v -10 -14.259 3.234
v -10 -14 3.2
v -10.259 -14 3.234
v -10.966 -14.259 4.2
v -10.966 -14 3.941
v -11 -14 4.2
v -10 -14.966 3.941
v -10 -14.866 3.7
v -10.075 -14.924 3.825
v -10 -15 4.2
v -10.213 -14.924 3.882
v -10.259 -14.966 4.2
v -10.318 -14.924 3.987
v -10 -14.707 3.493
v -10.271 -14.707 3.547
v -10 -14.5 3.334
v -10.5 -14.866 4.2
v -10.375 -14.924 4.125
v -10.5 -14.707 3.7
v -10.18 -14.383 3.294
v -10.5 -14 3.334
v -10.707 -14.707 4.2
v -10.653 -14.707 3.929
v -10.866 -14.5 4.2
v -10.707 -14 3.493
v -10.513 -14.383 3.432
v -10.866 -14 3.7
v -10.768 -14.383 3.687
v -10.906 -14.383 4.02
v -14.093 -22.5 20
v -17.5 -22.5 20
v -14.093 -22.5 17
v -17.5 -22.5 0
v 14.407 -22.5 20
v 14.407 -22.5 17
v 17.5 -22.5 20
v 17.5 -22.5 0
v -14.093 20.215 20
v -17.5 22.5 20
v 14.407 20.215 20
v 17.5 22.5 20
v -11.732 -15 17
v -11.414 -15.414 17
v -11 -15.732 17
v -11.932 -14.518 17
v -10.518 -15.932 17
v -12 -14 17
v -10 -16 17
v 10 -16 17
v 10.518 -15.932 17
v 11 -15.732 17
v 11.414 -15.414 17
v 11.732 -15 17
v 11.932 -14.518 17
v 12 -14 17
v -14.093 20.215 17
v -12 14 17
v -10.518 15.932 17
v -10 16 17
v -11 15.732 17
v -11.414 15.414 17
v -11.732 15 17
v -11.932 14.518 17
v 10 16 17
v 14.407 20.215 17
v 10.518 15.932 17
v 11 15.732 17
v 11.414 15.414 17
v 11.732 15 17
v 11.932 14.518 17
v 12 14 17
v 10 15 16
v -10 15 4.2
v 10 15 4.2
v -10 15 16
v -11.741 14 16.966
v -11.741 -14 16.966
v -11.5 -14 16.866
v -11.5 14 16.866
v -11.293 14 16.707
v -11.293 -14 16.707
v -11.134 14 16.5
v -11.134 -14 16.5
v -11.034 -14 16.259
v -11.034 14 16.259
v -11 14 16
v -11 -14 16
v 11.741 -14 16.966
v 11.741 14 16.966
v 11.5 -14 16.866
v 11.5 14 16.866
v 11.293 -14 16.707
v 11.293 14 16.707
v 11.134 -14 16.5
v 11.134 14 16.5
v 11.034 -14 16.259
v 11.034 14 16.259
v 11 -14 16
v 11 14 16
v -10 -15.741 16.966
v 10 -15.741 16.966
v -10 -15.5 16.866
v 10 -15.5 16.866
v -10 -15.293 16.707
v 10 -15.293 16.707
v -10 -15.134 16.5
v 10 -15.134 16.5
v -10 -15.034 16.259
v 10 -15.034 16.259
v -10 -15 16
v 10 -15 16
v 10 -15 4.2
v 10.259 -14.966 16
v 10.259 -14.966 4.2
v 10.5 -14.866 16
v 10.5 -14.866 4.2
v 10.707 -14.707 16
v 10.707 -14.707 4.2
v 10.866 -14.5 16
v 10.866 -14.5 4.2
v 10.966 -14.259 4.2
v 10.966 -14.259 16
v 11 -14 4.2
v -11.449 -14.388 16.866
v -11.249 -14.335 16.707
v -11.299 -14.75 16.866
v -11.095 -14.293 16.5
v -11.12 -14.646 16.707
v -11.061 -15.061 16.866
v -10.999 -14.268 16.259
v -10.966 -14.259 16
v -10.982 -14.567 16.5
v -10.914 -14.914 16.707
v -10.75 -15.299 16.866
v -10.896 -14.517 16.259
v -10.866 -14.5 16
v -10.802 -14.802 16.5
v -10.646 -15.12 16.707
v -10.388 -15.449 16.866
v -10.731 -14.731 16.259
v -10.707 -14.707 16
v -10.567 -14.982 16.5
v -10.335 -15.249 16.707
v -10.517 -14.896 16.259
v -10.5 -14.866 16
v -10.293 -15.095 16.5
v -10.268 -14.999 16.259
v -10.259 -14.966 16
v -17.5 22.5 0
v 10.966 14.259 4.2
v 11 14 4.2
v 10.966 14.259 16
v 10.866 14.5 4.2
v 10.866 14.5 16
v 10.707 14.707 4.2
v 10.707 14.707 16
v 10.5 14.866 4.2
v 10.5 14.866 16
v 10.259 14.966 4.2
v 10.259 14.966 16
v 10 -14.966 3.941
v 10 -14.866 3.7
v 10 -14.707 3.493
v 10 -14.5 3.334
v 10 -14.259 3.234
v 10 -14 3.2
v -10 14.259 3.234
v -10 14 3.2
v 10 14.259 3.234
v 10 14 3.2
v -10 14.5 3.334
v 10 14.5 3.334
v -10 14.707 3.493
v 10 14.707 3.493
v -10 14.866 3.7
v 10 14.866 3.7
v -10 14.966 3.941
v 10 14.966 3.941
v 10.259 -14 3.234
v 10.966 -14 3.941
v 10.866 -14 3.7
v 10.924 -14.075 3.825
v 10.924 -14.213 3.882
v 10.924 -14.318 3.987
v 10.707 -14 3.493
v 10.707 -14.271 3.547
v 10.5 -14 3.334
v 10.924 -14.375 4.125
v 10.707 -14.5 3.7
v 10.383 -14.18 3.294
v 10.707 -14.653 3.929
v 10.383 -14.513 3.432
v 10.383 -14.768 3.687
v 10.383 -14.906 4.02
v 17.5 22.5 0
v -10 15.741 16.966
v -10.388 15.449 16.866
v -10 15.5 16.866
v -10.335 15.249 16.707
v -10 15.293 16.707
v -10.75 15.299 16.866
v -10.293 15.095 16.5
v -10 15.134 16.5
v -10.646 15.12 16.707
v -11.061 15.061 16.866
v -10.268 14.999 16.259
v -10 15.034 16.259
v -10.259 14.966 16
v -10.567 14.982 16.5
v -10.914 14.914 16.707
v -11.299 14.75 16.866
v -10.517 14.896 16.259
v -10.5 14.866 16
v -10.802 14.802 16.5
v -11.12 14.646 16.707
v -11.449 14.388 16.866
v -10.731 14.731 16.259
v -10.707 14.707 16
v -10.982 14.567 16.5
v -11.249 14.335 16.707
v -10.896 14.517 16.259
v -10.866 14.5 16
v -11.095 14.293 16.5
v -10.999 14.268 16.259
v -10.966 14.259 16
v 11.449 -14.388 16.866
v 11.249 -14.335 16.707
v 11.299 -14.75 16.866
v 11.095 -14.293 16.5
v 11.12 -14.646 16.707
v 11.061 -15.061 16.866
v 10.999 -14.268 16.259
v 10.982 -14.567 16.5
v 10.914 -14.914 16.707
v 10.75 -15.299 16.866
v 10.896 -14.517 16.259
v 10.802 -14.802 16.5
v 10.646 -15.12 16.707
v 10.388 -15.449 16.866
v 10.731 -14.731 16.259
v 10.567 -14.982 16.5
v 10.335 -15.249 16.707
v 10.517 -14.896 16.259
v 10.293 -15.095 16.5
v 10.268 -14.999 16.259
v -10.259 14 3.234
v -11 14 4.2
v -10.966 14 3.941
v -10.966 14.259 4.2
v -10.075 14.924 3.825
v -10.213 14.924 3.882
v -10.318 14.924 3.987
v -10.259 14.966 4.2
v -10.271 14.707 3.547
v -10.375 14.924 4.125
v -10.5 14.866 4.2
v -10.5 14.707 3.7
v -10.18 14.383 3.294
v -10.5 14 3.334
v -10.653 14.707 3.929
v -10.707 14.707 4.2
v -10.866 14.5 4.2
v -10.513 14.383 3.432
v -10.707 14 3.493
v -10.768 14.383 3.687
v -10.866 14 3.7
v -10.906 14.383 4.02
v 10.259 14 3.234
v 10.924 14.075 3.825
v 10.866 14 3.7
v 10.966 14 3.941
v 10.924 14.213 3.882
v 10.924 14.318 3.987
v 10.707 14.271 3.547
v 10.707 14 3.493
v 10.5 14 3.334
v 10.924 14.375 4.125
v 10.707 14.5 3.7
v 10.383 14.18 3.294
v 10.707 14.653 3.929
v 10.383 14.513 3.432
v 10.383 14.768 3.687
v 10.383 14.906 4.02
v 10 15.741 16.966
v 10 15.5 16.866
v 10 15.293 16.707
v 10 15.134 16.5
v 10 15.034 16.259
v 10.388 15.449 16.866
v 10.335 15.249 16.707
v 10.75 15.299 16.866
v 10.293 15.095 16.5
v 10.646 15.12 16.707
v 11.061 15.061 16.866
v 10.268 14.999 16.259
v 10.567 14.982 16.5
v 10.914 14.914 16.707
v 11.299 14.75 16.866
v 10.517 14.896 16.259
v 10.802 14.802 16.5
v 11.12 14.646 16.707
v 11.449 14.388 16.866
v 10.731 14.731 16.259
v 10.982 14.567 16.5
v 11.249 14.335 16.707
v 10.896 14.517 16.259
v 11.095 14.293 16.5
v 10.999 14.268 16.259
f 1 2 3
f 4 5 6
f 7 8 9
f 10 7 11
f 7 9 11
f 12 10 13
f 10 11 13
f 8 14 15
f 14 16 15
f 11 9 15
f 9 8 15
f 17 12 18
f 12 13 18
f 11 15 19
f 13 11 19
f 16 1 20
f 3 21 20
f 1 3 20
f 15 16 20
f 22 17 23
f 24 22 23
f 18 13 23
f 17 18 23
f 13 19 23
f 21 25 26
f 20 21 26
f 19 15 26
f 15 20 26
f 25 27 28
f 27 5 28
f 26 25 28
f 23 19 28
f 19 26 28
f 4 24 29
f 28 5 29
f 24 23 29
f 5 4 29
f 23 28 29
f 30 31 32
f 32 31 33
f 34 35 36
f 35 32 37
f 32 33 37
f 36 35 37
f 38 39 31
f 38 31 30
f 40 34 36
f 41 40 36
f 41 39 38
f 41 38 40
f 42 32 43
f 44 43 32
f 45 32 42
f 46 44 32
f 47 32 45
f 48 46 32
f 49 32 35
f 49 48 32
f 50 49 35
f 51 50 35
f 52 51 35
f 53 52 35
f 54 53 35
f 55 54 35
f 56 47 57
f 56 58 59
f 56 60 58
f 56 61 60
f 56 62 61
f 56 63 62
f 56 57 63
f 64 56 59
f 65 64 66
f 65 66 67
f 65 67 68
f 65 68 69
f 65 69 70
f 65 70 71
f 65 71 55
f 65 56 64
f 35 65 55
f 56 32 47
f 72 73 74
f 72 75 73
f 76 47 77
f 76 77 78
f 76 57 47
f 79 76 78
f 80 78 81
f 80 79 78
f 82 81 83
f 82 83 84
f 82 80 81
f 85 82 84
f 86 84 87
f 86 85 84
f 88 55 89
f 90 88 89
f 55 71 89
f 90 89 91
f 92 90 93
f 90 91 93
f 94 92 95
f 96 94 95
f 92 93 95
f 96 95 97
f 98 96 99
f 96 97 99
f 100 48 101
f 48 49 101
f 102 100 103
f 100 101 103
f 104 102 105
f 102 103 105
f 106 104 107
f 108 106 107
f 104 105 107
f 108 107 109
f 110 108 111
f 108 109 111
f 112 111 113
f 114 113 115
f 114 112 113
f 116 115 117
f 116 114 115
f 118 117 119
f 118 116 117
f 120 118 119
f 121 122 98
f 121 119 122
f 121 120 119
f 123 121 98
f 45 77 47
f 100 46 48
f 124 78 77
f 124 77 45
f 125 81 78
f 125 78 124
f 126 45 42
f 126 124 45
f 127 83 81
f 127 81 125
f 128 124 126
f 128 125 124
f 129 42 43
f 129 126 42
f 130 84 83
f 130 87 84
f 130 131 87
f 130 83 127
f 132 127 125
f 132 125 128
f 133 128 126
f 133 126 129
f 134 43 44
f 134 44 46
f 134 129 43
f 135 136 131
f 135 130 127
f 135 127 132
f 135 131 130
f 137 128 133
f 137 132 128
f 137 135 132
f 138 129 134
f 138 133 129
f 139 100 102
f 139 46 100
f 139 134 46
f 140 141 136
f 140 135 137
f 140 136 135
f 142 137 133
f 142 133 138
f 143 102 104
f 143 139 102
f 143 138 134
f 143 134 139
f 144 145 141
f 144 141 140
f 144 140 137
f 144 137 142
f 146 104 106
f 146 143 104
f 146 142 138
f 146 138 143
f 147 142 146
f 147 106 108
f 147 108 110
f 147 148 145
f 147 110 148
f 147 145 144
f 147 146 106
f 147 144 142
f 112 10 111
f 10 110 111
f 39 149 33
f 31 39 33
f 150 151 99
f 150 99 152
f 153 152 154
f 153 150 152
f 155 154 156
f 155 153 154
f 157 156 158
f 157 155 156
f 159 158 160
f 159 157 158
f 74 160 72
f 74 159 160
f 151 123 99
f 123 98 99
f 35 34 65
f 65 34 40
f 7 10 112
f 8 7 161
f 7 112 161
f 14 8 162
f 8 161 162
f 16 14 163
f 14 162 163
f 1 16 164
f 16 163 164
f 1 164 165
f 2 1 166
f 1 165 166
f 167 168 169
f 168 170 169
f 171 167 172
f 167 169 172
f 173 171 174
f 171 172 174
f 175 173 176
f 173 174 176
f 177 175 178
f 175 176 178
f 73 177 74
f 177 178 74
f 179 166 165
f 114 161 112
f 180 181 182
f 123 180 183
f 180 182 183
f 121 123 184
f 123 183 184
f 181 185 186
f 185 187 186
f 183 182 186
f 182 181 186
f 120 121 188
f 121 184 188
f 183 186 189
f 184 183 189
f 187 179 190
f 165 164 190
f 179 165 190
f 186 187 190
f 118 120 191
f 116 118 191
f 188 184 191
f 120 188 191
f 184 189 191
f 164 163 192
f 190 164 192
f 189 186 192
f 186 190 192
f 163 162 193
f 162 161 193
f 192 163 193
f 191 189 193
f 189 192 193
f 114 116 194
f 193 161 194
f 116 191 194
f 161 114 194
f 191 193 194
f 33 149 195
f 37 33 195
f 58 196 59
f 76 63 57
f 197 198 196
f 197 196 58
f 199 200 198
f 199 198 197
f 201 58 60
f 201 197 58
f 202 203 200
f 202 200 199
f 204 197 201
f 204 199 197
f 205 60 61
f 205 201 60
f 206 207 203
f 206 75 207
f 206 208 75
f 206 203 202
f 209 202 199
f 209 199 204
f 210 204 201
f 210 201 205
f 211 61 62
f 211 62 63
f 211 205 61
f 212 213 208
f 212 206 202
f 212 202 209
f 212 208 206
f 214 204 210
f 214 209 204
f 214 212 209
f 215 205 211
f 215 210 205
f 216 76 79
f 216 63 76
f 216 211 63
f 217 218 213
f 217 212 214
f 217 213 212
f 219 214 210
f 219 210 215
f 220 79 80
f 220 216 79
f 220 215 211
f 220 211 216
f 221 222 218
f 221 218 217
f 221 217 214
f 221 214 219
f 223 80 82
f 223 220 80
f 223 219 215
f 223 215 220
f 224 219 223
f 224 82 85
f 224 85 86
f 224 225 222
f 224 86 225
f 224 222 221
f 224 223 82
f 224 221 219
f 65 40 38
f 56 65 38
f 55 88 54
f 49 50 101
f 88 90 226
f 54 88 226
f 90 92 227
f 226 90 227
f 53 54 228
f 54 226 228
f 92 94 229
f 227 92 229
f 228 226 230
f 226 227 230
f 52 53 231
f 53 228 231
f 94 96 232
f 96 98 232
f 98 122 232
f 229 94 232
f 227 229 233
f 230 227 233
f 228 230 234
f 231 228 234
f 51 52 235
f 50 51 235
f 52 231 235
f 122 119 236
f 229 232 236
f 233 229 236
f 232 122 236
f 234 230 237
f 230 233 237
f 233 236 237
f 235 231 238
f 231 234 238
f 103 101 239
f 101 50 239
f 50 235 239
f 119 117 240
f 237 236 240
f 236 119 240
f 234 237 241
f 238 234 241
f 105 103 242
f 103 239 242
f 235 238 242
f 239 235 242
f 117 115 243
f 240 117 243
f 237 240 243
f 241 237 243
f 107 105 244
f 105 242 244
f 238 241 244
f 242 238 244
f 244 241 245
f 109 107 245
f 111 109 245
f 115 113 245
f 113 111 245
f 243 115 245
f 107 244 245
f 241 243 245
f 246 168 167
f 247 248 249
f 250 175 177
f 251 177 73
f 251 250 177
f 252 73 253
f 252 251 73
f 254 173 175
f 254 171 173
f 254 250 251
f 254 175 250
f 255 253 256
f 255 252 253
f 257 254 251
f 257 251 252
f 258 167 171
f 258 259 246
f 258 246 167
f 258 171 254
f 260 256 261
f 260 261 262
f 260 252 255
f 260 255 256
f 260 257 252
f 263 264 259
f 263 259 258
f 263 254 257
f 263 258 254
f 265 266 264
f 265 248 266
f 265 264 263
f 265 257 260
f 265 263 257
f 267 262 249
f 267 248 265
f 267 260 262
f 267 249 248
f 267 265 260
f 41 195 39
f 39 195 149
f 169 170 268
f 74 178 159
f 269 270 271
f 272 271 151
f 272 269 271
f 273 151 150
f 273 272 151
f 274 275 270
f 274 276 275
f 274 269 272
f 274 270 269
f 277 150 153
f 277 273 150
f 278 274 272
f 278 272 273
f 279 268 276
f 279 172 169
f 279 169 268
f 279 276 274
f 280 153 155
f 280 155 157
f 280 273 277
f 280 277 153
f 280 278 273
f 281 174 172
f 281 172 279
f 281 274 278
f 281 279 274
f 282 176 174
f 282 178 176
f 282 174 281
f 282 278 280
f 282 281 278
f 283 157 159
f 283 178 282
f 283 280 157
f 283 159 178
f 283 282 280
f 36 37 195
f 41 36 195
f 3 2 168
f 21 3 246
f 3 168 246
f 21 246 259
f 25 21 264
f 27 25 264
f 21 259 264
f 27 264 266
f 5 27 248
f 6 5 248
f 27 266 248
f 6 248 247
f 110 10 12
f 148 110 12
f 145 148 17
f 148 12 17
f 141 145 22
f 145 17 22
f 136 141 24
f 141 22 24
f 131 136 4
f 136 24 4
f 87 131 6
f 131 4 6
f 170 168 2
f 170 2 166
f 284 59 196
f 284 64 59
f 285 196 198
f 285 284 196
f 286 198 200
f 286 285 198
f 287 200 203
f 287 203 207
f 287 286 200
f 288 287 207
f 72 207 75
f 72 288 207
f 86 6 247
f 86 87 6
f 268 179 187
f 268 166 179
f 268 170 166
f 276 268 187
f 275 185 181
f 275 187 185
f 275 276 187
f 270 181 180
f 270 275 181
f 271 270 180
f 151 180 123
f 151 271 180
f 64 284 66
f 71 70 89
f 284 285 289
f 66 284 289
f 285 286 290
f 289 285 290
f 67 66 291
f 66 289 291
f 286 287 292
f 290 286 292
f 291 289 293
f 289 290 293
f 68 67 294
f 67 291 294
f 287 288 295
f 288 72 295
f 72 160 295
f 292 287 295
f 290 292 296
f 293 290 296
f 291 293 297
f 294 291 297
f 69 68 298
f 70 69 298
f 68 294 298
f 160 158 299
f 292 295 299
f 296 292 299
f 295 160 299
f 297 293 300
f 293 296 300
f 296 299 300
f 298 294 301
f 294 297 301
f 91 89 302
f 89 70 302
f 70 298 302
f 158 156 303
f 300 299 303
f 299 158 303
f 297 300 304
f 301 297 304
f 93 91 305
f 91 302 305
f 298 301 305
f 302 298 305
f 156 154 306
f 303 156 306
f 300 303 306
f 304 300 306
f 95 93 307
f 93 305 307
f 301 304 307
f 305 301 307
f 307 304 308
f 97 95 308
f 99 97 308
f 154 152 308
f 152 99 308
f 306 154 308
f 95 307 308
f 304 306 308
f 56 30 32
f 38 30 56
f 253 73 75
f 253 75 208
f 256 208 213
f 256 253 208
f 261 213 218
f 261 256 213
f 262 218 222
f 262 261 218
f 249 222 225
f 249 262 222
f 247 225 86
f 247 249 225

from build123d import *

# Parameters (mm, degrees)
F1_DEPTH = 20
F3_DEPTH = 3
F4_W     = 22
F4_H     = 30
F5_DEPTH = 13.8
F6_W     = 28.5
F6_H     = 2.2146213427
F7_DEPTH = 3
F8_R     = 1


with BuildPart() as f1:
    # F0 (on Top) → F1 (new body)
    with BuildSketch(Plane.XY):
        Polygon((0, 22.5), (-17.5, 22.5), (-17.5, 0), (-14.605, 0), (0, 0), (0, 20.066), align=None)
        Polygon((17.5, 22.5), (0, 22.5), (0, 20.066), (0, 0), (-14.605, 0), (-17.5, 0), (-17.5, -22.5), (17.5, -22.5), align=None)
    extrude(amount=F1_DEPTH)

    # F2 (on face) → F3 (cut)
    with BuildSketch(Plane.XY.offset(20)):
        Polygon((0.1571281302, 20.2146213427), (-14.0928718698, 20.2146213427), (-14.0928718698, 0), (-14.0928718698, -20.2853786573), (14.4071281302, -20.2853786573), (14.4071281302, 20.2146213427), align=None)
    extrude(amount=-F3_DEPTH, mode=Mode.SUBTRACT)

    # F4 (on face) → F5 (cut)
    with BuildSketch(Plane.XY.offset(17)):
        Rectangle(F4_W, F4_H)
    extrude(amount=-F5_DEPTH, mode=Mode.SUBTRACT)

    # F6 (on face) → F7 (cut, through all)
    with BuildSketch(Plane.XY.offset(20)):
        with Locations((0.1571281302, -21.3926893286)):
            Rectangle(F6_W, F6_H)
    extrude(amount=-F7_DEPTH, mode=Mode.SUBTRACT)

    # F8
    f8_edges = [f1.edges().sort_by_distance(p)[0] for p in [
        (-11, 0, 3.2),
        (0, -15, 3.2),
        (0, 15, 3.2),
        (11, 0, 3.2),
        (0, 15, 17),
        (11, 0, 17),
        (-11, 0, 17),
        (0, -15, 17),
        (11, 15, 10.1),
        (-11, 15, 10.1),
        (11, -15, 10.1),
        (-11, -15, 10.1),
    ]]
    fillet(f8_edges, radius=F8_R)


solid = f1.part
